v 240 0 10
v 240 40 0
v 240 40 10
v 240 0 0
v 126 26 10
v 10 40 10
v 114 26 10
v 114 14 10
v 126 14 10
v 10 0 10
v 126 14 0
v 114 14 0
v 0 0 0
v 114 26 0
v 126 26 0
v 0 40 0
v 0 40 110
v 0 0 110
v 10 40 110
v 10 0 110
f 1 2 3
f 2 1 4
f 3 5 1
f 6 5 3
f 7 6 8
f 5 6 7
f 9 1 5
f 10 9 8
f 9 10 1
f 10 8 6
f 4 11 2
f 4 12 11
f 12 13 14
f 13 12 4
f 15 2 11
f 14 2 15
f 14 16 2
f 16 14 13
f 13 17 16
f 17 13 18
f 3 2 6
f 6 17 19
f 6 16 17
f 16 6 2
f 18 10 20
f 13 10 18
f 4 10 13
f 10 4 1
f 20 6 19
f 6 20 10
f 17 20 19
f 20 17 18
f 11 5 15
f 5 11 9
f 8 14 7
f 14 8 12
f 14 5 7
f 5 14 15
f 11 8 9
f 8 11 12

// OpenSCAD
$fn = 32;

// ----------------------------------------------------------------------
// Gantry bracket: 200-250 mm L bracket
// ----------------------------------------------------------------------

// --- parameters (mm) ---
base_l = 240;             // base arm length, X
arm_w = 40;               // arm width, Y
thick = 10;               // arm thickness
up_h = 100;               // vertical arm height, Z
slot_w = 12;              // adjustment slot width in the base

total_h = up_h + thick;  // overall height

difference() {
  union() {
    cube([base_l, arm_w, thick]);
    cube([thick, arm_w, total_h]);
  }
  translate([base_l / 2 - slot_w / 2, arm_w / 2 - slot_w / 2, -1])
    cube([slot_w, slot_w, thick + 2]);
}
